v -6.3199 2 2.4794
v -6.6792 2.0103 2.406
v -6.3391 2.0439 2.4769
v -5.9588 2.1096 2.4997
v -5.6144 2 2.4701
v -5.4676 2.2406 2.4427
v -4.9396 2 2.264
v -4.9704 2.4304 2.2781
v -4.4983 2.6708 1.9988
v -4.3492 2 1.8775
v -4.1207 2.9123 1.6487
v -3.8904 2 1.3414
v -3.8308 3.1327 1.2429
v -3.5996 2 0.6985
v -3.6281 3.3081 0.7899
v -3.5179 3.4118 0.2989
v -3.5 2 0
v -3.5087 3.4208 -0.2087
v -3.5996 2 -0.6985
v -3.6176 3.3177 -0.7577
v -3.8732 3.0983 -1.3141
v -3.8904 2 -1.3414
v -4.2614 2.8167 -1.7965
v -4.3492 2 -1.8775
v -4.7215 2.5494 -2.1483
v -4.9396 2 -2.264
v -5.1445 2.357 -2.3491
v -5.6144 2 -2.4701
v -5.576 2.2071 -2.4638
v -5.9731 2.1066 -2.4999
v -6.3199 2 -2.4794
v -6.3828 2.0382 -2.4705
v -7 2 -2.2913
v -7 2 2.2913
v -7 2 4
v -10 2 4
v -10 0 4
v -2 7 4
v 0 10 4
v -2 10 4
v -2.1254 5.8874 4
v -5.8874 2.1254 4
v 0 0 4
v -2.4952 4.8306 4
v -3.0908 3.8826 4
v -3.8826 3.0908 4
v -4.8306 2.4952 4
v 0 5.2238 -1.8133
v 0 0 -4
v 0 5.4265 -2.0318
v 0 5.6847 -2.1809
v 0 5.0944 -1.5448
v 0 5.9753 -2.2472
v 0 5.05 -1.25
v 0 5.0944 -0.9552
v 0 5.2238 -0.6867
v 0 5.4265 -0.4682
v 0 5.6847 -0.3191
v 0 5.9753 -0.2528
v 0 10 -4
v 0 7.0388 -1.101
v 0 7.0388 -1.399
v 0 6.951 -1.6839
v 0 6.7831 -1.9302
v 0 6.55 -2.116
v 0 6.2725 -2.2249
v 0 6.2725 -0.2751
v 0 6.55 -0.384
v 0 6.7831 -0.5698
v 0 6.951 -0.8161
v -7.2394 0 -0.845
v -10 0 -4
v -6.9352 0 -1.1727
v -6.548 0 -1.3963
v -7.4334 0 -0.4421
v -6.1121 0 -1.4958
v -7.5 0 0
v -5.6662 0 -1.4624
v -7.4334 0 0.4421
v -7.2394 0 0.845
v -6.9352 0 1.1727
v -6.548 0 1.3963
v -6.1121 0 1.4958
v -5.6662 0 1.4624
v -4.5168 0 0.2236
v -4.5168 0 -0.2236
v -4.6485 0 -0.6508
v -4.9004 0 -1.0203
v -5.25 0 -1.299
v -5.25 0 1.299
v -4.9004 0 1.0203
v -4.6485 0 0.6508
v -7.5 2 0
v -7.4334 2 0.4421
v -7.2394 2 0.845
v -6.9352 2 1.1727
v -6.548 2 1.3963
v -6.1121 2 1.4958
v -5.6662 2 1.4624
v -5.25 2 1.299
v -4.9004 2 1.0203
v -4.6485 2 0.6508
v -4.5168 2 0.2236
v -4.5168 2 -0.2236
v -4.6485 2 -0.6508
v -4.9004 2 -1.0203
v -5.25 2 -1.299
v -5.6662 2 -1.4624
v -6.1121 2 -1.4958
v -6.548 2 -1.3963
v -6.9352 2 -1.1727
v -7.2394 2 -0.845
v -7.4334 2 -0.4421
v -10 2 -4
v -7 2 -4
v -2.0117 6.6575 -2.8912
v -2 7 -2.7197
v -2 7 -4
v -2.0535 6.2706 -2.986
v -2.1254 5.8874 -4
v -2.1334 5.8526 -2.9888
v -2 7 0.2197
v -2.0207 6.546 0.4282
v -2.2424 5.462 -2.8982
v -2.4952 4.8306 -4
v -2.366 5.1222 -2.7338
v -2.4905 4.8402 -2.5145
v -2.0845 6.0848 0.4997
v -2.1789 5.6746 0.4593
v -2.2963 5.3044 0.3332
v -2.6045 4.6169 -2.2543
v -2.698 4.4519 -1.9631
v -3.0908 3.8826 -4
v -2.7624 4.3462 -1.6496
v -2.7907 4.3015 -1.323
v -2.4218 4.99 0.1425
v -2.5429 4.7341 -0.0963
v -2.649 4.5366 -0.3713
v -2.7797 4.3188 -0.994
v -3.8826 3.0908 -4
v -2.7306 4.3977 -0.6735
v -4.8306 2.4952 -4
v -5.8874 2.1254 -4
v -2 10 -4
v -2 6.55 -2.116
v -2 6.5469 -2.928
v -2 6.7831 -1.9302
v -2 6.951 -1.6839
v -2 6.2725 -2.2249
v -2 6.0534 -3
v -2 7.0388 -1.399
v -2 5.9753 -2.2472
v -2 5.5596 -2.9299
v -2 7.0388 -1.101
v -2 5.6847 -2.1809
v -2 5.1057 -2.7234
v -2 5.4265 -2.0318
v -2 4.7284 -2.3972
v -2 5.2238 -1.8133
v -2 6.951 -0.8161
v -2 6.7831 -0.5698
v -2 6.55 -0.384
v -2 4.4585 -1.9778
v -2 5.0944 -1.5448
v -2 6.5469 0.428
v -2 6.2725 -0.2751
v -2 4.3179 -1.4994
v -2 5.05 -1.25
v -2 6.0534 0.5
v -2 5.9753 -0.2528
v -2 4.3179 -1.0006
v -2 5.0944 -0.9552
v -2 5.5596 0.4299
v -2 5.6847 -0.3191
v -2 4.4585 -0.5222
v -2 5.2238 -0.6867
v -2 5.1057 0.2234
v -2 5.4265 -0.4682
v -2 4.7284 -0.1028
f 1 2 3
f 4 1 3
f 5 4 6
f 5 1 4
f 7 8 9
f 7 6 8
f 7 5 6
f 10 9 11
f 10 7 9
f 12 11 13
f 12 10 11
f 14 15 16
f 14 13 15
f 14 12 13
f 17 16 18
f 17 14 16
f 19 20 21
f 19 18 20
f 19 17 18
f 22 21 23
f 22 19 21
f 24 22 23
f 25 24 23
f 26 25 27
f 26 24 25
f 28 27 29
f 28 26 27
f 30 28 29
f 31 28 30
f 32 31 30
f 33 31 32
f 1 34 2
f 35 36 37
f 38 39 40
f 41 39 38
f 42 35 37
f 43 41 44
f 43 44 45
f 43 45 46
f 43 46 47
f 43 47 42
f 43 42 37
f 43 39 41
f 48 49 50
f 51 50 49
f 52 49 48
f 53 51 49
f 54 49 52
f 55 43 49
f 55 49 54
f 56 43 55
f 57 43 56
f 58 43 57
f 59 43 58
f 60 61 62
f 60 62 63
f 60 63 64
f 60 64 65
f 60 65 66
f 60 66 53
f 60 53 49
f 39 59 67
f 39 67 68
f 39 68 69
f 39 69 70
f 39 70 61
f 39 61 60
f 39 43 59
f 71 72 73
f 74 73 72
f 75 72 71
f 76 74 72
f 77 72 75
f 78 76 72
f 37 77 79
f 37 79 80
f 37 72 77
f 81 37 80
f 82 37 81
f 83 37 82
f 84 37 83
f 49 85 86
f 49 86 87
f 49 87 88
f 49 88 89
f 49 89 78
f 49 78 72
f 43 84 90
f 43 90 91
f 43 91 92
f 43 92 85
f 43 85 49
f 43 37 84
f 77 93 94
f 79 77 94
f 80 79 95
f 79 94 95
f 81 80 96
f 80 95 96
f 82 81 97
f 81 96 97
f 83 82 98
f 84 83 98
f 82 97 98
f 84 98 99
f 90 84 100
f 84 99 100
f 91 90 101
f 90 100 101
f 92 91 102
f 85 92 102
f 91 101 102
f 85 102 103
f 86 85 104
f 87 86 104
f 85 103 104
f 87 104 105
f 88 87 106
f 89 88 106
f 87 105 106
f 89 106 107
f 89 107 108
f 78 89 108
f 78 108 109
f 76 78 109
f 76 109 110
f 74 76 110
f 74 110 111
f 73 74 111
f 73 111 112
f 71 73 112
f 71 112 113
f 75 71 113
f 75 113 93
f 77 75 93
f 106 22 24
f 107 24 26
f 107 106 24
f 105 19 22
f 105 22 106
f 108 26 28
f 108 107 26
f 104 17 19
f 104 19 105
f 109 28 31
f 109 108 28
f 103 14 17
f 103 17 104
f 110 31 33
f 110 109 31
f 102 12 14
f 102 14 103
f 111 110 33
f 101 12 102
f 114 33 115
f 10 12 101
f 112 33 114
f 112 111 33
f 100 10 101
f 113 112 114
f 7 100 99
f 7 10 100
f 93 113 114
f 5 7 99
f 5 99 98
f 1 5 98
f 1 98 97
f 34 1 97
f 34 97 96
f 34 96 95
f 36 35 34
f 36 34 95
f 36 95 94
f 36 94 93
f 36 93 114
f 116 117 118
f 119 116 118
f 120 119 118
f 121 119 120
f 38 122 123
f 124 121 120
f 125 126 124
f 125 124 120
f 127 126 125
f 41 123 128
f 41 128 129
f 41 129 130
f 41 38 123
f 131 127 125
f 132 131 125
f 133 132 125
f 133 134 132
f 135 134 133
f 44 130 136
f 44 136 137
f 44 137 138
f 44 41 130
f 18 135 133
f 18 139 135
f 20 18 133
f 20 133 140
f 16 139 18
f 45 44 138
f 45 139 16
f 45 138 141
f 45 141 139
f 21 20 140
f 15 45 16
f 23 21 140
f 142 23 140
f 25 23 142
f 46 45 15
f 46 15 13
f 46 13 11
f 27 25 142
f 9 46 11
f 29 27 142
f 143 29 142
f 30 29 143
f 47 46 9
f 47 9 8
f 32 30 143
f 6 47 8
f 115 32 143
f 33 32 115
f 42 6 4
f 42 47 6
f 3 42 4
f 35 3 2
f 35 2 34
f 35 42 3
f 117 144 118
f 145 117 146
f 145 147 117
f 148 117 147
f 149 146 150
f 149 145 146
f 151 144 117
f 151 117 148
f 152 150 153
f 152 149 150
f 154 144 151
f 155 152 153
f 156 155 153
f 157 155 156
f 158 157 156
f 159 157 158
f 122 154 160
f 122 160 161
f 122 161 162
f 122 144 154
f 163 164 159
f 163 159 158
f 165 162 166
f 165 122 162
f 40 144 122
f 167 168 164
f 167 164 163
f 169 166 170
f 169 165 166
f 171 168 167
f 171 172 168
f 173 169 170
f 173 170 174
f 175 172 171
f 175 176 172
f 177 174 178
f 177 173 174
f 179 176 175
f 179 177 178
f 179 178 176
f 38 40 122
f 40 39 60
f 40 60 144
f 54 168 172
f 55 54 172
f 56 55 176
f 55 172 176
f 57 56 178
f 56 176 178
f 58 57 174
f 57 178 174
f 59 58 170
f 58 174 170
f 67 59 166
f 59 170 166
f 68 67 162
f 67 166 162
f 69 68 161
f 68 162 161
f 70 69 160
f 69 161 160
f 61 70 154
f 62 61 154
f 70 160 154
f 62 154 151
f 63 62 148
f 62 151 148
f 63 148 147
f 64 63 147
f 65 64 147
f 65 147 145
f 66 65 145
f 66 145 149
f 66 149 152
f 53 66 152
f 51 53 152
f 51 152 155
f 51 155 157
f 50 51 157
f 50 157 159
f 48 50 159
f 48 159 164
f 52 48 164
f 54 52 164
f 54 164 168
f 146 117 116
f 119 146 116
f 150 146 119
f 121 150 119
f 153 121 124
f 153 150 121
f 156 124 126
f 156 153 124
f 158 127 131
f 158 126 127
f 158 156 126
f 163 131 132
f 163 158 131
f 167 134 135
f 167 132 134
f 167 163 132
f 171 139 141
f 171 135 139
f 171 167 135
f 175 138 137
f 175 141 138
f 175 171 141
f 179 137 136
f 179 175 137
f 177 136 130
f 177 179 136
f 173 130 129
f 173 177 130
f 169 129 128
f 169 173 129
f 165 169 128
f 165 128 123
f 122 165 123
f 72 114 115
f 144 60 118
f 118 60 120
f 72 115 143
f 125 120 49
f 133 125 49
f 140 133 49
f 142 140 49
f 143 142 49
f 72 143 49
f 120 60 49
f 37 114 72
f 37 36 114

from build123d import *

# Parameters (mm, degrees)
BOSS_EXTRUDE1_DEPTH = 4
SKETCH2_R           = 1.5
CUT_EXTRUDE1_DEPTH  = 8
SKETCH3_R           = 1
CUT_EXTRUDE2_DEPTH  = 8
FILLET1_R           = 5
SKETCH4_R           = 2.5
CUT_EXTRUDE3_DEPTH  = 8
SKETCH5_R           = 1.75
CUT_EXTRUDE4_DEPTH  = 8


with BuildPart() as part:
    # Sketch1 → Boss-Extrude1 (new, symmetric)
    with BuildSketch(Plane.XY):
        Polygon((-10, 0), (0, 0), (0, 10), (-2, 10), (-2, 2), (-10, 2), align=None)
    extrude(amount=BOSS_EXTRUDE1_DEPTH, both=True)

    # Sketch2 → Cut-Extrude1 (cut)
    with BuildSketch(Plane(origin=(0, 2, 0), x_dir=(1, 0, 0), z_dir=(0, 1, 0))):
        with Locations(Location((-6, 0, 0), (0, 0, 180))):
            Circle(SKETCH2_R)
    extrude(amount=-CUT_EXTRUDE1_DEPTH, mode=Mode.SUBTRACT)

    # Sketch3 → Cut-Extrude2 (cut)
    with BuildSketch(Plane.ZY.offset(2)):
        with Locations(Location((-1.25, 6.05, 0), (0, 0, 270))):
            Circle(SKETCH3_R)
    extrude(amount=-CUT_EXTRUDE2_DEPTH, mode=Mode.SUBTRACT)

    # Fillet1
    # the kernel refuses this fillet: 5 mm, written as the material it adds along each edge
    with BuildSketch(Plane(origin=(-2, 2, 4), x_dir=(0, 1, 0), z_dir=(0, 0, -1))) as fillet1_piece_1_section:
        with BuildLine():
            CenterArc((FILLET1_R, -FILLET1_R), FILLET1_R, 90, 90)
            Line((0, -FILLET1_R), (0, 0))
            Line((0, 0), (FILLET1_R, 0))
        make_face()
    fillet1_piece_1 = extrude(amount=8, mode=Mode.PRIVATE)
    fillet1_piece_1 = fillet1_piece_1 - Plane(origin=(-6, 3.13209962, 0), x_dir=(-1, 0, 0), z_dir=(0, 1, 0)) * Cylinder(1.5, 36, mode=Mode.PRIVATE)
    fillet1_piece_1 = fillet1_piece_1 - Plane(origin=(-3.062165259, 6.05, -1.25), x_dir=(0, -1, 0), z_dir=(-1, 0, 0)) * Cylinder(1, 36, mode=Mode.PRIVATE)
    add(fillet1_piece_1)

    # Sketch4 → Cut-Extrude3 (cut)
    with BuildSketch(Plane(origin=(0, 2, 0), x_dir=(1, 0, 0), z_dir=(0, 1, 0))):
        with Locations((-6, 0)):
            Circle(SKETCH4_R)
    extrude(amount=CUT_EXTRUDE3_DEPTH, mode=Mode.SUBTRACT)

    # Sketch5 → Cut-Extrude4 (cut)
    with BuildSketch(Plane.ZY.offset(2)):
        with Locations((-1.25, 6.05)):
            Circle(SKETCH5_R)
    extrude(amount=CUT_EXTRUDE4_DEPTH, mode=Mode.SUBTRACT)


solid = part.part
